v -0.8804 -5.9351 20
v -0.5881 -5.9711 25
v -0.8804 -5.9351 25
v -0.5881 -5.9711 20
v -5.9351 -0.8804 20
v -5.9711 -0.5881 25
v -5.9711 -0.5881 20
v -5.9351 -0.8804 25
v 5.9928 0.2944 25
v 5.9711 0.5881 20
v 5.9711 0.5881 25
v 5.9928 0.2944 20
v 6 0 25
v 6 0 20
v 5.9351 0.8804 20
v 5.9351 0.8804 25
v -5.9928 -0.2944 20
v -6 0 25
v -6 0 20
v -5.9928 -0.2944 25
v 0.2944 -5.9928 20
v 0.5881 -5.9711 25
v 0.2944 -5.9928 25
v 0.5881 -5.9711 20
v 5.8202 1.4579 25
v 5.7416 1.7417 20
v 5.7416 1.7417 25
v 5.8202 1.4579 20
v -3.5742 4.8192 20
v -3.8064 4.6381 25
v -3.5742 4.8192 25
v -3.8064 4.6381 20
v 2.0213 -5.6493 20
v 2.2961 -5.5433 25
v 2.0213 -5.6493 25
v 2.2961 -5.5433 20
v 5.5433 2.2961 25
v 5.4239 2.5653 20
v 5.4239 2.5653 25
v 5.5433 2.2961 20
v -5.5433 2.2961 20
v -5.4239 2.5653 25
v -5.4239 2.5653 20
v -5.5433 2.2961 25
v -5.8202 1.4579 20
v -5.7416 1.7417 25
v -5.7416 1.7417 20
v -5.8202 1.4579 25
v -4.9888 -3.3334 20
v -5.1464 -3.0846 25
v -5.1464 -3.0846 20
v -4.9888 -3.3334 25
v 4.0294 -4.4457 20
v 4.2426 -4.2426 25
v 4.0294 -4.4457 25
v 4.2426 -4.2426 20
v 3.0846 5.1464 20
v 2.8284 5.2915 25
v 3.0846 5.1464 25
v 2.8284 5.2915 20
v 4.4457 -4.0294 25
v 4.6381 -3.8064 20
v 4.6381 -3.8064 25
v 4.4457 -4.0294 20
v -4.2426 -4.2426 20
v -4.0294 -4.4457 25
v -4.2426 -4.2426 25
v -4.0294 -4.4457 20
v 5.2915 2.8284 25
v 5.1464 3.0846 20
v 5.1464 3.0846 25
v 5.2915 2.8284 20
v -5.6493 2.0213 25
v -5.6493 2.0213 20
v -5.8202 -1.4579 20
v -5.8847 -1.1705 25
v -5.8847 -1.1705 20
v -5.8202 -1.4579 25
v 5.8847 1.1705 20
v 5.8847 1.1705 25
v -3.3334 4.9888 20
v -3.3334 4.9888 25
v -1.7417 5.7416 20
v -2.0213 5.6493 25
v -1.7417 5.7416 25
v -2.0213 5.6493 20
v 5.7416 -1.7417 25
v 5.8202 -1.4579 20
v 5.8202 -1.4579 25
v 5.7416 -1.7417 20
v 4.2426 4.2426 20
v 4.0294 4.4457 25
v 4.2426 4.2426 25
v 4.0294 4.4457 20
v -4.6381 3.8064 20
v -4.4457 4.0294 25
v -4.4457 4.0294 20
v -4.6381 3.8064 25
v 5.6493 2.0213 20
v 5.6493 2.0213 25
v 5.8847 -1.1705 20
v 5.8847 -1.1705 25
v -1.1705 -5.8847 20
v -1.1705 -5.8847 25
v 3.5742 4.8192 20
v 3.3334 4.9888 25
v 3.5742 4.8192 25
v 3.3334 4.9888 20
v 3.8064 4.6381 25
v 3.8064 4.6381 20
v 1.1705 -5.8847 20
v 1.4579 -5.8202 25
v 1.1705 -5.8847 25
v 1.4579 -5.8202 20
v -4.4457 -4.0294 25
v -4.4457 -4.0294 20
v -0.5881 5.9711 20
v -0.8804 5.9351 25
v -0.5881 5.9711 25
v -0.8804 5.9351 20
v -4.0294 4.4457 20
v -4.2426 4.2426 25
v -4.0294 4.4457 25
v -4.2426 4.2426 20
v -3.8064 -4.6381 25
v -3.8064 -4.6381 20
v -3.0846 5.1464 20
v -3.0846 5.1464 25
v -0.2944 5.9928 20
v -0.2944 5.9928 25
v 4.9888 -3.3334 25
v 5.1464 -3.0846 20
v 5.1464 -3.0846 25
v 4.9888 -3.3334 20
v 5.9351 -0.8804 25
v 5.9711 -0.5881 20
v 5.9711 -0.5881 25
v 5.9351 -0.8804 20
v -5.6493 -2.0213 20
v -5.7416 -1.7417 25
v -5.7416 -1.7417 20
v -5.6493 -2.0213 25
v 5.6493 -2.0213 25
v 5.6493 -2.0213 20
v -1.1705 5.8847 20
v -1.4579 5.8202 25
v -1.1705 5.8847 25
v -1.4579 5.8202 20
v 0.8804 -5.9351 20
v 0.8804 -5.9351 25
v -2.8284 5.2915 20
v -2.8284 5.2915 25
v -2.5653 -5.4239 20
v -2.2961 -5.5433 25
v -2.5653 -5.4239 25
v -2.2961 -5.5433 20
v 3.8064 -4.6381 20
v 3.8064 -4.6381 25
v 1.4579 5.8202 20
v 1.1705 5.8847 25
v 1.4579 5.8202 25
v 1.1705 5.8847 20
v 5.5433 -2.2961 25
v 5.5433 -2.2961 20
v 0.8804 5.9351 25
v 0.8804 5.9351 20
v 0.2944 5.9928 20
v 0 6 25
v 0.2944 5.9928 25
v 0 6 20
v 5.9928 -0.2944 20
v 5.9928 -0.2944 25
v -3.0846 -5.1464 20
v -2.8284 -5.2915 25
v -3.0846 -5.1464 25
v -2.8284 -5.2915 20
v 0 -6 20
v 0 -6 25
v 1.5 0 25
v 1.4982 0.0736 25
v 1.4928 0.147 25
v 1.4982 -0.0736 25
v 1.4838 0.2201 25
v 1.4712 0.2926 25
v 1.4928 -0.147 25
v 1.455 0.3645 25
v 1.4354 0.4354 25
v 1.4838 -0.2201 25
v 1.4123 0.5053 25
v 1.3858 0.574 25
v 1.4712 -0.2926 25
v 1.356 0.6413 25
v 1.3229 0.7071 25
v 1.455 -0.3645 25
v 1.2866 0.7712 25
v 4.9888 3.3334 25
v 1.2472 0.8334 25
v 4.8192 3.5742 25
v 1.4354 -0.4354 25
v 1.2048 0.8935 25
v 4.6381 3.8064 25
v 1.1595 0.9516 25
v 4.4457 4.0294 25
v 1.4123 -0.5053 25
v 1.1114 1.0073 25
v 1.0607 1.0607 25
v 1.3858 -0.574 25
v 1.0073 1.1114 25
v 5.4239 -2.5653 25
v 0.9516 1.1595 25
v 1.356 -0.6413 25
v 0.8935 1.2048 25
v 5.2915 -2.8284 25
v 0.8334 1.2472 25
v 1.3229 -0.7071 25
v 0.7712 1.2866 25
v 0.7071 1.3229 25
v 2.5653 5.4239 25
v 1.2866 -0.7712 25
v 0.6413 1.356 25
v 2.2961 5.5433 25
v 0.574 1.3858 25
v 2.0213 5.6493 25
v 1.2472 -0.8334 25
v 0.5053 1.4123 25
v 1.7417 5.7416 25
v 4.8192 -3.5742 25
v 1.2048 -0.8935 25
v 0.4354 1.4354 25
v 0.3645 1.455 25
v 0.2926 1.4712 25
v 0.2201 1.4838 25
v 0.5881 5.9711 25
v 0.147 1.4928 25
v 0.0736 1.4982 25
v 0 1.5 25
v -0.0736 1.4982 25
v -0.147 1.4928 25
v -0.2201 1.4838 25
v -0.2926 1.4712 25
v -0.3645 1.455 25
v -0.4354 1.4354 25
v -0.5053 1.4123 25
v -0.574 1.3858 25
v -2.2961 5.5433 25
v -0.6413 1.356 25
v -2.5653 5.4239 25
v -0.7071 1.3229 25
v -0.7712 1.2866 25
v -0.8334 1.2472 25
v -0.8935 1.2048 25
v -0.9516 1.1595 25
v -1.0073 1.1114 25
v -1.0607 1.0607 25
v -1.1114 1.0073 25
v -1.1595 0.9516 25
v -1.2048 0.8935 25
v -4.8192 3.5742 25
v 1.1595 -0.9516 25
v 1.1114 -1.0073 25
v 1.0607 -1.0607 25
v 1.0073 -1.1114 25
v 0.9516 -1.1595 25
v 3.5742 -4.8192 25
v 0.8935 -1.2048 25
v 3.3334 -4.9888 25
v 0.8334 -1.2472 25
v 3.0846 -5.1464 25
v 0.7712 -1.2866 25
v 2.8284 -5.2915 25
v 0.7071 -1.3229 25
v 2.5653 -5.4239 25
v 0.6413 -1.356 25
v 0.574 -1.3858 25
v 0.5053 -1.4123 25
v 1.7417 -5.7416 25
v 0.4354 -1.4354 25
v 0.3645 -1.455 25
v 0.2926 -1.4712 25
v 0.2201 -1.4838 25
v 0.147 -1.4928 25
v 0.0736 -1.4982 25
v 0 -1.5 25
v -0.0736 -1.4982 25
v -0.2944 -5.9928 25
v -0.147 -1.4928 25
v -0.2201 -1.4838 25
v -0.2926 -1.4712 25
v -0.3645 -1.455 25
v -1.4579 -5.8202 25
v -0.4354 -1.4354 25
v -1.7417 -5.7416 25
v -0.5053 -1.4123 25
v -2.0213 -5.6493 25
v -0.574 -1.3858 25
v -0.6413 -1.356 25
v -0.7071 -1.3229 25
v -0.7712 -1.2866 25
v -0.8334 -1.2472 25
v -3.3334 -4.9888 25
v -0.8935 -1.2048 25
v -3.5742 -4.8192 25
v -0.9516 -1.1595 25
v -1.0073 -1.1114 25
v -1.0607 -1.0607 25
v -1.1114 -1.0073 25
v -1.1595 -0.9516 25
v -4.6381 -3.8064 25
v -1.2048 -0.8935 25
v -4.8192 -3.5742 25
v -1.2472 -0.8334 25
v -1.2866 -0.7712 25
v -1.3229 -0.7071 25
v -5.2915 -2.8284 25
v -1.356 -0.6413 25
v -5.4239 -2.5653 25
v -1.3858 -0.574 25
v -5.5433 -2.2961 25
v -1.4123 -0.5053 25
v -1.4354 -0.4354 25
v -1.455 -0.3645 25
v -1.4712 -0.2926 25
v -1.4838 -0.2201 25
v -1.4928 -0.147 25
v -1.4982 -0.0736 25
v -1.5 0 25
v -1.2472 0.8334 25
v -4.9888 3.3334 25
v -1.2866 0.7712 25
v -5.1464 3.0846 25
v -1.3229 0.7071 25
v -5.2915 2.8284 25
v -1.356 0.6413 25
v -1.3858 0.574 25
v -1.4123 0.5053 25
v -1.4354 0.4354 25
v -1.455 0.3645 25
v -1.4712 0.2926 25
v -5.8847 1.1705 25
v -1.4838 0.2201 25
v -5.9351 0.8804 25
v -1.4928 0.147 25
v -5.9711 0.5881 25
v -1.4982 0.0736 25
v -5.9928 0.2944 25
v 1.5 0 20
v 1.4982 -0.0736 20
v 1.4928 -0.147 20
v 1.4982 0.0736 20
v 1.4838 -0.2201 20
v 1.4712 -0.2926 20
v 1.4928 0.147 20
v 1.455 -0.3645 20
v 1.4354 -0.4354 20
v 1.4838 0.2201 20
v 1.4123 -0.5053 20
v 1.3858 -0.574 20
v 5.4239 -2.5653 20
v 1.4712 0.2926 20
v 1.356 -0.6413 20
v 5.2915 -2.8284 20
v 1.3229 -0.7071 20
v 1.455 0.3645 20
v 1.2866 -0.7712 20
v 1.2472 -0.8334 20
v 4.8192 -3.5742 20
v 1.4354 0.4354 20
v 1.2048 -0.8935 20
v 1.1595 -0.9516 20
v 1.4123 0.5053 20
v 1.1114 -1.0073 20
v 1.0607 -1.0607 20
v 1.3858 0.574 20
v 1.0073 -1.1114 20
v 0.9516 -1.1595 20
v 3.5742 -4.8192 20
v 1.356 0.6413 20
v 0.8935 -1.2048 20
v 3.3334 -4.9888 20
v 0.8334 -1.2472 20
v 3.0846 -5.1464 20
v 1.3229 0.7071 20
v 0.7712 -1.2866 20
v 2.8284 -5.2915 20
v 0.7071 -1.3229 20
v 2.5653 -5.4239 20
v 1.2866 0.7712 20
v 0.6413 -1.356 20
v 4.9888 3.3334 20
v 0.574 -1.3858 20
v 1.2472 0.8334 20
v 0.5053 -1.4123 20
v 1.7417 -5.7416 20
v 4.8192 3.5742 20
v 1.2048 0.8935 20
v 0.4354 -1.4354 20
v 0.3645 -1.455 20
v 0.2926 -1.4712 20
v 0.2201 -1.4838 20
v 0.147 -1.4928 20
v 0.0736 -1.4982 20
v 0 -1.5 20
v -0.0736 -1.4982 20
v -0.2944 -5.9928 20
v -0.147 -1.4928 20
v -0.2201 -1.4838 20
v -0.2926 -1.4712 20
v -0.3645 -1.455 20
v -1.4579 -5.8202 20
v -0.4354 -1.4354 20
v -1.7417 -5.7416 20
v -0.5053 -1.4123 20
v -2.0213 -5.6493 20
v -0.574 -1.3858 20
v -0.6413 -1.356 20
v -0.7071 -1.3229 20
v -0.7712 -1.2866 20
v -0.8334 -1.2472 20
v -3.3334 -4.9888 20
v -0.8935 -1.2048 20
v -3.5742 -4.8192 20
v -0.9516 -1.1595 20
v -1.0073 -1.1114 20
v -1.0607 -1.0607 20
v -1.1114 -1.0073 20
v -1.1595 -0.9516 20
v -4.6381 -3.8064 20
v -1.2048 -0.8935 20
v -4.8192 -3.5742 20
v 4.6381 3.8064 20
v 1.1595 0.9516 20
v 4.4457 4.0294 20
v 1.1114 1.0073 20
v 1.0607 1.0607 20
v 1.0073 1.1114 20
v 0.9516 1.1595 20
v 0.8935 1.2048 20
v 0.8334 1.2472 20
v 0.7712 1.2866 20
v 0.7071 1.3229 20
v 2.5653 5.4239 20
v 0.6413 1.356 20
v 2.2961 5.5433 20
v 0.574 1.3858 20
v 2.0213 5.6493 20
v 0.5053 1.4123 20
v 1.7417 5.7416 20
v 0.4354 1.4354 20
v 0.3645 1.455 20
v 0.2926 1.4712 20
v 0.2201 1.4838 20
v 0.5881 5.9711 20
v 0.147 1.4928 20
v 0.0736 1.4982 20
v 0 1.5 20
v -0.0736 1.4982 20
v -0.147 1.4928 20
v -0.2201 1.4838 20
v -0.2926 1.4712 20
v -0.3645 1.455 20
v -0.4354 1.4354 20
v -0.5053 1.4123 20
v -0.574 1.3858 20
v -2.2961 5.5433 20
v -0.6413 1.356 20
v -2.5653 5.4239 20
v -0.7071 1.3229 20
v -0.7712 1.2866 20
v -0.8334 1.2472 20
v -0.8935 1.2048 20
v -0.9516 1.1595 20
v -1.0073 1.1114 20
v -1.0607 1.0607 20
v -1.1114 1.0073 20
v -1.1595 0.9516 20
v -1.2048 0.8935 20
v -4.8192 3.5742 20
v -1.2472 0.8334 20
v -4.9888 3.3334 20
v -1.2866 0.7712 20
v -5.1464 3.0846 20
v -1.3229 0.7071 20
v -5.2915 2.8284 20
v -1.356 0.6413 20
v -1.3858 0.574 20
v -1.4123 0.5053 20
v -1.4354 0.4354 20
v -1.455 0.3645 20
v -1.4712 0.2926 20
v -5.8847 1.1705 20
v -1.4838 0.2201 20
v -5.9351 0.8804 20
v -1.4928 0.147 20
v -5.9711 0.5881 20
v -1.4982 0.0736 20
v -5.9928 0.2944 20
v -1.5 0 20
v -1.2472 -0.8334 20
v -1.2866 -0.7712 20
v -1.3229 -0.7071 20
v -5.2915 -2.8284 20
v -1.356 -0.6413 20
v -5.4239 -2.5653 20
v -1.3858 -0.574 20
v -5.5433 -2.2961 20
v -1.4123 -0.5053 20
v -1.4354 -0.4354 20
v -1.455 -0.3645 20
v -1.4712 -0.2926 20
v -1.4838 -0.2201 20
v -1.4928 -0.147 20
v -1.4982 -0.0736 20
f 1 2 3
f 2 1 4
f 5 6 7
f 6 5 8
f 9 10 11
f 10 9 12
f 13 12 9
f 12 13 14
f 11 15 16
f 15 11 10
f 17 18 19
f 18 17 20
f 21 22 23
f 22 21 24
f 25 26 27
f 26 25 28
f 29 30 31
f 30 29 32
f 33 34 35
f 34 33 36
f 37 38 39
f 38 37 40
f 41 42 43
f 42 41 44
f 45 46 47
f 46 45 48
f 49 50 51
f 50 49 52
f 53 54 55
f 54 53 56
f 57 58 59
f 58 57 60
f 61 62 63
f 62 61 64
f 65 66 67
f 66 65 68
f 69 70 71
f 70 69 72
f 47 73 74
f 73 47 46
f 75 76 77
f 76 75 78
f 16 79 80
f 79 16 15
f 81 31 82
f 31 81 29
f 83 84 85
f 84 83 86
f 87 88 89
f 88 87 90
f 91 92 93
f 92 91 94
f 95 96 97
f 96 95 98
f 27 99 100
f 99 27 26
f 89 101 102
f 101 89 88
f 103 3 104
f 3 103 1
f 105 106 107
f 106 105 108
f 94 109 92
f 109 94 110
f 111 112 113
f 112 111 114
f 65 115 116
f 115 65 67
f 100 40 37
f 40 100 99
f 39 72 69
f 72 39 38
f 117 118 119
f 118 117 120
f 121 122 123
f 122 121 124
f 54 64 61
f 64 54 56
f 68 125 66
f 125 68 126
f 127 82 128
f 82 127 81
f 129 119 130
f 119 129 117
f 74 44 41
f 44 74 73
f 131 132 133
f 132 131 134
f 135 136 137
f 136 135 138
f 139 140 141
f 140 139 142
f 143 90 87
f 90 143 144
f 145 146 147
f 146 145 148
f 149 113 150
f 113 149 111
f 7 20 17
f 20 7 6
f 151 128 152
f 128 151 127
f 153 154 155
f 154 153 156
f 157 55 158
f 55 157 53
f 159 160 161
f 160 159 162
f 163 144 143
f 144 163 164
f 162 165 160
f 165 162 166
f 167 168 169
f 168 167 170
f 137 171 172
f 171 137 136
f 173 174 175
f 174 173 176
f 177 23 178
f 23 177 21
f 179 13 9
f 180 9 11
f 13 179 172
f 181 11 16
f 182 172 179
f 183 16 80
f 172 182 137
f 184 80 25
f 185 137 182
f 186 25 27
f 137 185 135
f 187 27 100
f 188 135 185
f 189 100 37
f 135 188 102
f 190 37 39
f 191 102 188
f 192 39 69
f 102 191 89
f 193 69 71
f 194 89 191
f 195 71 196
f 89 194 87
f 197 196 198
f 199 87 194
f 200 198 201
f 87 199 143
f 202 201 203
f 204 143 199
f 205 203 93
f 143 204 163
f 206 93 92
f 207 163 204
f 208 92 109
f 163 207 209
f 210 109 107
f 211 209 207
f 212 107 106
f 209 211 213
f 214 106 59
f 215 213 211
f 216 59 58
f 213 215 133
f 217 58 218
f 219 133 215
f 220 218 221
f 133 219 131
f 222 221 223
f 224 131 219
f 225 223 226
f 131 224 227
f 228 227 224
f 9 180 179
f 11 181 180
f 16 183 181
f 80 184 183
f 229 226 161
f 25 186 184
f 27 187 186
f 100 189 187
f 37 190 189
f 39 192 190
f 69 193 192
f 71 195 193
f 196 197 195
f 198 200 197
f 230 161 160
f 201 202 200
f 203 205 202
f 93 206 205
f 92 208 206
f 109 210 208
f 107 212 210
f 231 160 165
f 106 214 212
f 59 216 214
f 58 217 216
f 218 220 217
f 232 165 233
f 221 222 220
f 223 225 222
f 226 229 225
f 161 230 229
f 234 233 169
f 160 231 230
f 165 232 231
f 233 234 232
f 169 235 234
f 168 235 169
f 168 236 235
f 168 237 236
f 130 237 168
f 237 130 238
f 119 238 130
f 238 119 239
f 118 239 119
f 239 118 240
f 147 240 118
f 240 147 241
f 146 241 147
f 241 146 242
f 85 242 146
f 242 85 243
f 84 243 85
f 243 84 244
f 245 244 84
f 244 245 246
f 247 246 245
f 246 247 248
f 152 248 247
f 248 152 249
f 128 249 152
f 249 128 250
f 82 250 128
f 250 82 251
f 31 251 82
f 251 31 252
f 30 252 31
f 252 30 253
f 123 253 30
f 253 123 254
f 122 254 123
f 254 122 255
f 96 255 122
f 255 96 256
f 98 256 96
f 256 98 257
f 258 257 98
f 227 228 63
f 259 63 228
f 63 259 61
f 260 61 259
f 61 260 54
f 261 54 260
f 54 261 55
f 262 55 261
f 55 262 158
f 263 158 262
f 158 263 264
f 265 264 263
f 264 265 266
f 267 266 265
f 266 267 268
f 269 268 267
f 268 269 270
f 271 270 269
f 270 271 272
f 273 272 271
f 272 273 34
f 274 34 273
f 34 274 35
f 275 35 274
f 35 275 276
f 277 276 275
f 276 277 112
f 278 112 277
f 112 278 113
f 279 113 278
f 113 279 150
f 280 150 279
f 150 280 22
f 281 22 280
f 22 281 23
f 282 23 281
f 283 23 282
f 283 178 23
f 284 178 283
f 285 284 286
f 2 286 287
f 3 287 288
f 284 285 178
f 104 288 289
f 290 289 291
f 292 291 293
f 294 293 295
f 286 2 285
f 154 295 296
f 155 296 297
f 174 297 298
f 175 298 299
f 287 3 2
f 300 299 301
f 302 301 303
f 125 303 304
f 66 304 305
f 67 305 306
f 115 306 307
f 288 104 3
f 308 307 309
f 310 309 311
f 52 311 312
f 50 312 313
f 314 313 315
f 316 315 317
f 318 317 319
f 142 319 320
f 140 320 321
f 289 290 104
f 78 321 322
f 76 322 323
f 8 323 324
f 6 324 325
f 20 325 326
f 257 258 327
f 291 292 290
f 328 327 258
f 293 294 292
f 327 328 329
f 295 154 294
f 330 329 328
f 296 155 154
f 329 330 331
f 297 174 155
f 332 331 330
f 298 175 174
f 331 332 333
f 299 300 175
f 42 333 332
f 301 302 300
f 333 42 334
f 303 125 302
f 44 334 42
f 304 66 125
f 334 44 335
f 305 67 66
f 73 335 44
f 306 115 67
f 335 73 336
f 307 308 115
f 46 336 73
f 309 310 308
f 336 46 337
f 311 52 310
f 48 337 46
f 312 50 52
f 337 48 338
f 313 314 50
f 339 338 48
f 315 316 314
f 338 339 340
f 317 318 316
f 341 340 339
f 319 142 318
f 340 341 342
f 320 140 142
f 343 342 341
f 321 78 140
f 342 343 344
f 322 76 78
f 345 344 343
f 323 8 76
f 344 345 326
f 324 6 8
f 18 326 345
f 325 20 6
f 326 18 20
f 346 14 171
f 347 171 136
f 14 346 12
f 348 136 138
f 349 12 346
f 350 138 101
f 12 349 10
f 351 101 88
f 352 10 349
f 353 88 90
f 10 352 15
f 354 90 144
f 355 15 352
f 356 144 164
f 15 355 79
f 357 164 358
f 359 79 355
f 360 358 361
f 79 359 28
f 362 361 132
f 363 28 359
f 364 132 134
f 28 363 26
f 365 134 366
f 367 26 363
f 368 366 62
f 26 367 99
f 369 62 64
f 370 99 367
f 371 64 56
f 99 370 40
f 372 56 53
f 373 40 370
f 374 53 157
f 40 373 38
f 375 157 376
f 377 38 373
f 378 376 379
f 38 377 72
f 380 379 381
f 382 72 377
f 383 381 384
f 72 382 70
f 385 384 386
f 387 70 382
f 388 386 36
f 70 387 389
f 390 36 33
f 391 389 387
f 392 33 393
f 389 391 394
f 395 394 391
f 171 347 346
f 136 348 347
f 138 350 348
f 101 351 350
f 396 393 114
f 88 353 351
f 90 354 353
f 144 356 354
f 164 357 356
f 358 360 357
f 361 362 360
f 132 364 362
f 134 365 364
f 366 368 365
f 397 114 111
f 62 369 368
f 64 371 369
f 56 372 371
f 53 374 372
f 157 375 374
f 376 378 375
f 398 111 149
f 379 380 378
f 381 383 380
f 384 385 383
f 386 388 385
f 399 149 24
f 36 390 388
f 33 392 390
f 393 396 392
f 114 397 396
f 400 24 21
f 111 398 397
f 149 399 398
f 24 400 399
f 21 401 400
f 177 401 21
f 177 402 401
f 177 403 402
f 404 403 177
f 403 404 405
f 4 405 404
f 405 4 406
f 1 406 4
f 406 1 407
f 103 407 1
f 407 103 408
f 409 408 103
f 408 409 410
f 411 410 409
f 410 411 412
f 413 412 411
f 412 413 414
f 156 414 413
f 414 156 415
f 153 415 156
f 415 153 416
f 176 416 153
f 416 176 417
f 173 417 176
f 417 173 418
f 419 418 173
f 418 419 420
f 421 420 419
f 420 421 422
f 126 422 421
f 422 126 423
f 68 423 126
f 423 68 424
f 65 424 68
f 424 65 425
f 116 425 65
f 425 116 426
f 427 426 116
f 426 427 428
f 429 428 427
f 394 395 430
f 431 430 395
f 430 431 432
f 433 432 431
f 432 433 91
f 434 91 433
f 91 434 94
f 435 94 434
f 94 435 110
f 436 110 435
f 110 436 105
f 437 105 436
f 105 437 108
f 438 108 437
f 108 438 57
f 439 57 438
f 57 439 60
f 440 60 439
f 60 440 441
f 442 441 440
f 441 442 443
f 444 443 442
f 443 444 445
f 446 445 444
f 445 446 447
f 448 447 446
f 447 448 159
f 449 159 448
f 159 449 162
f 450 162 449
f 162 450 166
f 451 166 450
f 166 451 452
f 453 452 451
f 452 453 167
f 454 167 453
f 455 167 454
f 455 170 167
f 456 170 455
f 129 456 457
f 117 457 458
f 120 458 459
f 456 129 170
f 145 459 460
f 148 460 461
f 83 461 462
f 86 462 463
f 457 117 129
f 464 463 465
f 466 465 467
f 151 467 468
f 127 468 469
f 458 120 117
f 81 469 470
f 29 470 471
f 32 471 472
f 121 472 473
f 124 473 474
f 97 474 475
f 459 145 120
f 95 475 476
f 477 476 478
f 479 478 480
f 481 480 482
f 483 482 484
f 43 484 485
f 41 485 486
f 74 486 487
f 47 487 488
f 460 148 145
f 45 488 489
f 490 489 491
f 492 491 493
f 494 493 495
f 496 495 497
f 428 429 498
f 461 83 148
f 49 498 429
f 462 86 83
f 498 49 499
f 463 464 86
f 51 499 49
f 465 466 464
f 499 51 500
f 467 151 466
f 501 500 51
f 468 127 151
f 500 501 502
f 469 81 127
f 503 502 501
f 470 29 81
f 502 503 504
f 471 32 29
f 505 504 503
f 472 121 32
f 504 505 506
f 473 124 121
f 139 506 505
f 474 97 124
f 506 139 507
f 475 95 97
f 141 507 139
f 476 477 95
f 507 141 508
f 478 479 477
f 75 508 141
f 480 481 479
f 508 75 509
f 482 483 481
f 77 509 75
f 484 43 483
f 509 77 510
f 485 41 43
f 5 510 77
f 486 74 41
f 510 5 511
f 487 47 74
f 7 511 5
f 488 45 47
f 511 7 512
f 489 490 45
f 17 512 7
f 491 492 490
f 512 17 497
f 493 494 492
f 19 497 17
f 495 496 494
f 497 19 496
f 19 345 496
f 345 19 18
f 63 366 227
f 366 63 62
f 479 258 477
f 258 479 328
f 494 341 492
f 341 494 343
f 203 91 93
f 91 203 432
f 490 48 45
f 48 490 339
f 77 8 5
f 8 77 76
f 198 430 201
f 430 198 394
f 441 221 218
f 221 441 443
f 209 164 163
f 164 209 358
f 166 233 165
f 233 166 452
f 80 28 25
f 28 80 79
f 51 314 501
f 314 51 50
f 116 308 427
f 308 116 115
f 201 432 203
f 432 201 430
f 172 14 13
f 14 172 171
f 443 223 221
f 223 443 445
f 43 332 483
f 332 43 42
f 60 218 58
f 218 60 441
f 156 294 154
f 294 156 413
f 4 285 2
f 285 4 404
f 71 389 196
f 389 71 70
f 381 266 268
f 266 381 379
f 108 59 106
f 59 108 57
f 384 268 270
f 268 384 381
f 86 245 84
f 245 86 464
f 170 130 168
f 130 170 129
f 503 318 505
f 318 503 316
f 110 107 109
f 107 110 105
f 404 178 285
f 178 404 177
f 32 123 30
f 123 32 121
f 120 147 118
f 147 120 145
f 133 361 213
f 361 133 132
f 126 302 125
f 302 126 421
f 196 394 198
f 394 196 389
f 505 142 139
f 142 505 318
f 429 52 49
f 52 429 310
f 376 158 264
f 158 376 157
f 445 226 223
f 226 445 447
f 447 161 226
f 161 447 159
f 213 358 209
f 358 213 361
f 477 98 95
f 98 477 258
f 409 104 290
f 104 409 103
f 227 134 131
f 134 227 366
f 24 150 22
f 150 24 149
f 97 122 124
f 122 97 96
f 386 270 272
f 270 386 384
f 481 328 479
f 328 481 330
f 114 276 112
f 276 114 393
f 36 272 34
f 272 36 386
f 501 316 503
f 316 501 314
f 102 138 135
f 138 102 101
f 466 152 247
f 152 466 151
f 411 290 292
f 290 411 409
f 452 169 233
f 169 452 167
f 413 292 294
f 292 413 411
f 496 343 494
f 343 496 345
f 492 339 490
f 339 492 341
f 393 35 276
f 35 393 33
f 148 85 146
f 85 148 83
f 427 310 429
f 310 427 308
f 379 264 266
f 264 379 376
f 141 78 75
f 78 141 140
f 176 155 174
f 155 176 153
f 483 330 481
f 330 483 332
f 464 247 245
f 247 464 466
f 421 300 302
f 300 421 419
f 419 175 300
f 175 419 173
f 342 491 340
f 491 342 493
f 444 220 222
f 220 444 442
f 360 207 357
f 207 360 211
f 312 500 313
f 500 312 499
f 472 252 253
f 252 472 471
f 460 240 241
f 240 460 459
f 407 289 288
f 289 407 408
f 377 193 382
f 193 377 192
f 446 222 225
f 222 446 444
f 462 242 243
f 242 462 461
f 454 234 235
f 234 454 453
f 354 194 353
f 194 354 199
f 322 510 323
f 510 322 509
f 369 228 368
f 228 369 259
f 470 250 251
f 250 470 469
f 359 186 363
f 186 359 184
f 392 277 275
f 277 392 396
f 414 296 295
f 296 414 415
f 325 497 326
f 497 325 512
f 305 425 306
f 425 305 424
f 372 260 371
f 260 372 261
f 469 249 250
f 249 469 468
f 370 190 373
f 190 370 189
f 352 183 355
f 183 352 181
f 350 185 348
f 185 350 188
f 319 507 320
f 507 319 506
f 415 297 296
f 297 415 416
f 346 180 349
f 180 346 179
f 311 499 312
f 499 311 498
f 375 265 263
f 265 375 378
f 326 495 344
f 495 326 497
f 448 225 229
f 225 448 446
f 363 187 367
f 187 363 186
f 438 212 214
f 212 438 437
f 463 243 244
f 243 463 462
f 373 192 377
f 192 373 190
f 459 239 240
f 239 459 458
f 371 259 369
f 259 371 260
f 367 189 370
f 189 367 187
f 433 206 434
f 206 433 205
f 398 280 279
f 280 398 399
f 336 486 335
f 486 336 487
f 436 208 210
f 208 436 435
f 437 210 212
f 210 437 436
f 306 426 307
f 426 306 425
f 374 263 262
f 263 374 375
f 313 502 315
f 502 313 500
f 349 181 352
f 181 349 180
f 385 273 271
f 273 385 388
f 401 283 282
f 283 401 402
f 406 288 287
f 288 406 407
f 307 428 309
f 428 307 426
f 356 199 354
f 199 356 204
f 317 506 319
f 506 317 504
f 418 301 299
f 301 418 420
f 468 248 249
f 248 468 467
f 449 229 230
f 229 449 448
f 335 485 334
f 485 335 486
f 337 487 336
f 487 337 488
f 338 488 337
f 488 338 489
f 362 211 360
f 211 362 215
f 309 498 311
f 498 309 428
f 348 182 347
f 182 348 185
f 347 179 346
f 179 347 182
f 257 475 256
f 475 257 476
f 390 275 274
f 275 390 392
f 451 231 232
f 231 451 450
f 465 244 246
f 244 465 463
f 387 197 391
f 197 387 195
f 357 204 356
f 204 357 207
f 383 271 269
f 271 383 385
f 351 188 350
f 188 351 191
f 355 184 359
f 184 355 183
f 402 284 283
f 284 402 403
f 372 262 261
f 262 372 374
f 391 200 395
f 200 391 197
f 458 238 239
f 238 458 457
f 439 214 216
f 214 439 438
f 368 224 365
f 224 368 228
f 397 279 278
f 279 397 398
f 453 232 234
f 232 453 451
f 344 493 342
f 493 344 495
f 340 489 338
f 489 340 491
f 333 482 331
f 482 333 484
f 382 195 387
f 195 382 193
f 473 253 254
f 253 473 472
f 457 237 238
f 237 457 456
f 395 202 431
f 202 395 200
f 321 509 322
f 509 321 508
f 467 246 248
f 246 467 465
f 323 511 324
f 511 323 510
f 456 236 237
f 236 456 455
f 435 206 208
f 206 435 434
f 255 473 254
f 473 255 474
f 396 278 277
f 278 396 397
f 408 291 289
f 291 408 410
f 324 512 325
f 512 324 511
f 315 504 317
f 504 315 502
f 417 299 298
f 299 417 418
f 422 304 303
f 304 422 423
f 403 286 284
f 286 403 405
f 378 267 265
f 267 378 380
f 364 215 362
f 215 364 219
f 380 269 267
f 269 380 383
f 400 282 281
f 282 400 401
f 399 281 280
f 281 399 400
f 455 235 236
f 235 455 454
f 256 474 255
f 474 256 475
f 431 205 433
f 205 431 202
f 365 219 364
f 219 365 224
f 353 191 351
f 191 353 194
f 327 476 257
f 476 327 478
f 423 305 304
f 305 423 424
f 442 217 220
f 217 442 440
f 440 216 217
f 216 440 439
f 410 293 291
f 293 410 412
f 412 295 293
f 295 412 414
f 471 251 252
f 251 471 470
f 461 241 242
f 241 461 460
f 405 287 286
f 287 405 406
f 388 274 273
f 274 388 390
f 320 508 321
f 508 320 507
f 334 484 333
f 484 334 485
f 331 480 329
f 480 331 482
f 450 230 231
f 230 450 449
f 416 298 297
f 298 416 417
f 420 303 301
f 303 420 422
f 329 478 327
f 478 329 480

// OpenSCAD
// Straight hose-barb reducer - joins 8mm ID tubing to 5mm ID tubing.
// Prints standing upright along Z, centred on origin.

$fn = 128;

// Dimensions
z_start = 0;
z_8mm_end = 20;
z_collar_start = 20;
z_collar_end = 25;
z_5mm_end = 41;

// 8mm Tubing Barbs (z = 0 to 20)
// Two stacked barbs, each 10mm tall.
// Profile: OD grows 7.5 -> 9.5, then steps back to 7.5.
barb_8_height = 10;
barb_8_bottom_od = 7.5;
barb_8_top_od = 9.5;
barb_8_step_od = 7.5;

// 5mm Tubing Barbs (z = 25 to 41)
// Two stacked barbs, each 8mm tall.
// Profile: OD shrinks 6.5 -> 5.0, then steps back to 6.5.
barb_5_height = 8;
barb_5_bottom_od = 6.5;
barb_5_top_od = 5.0;
barb_5_step_od = 6.5;

// Common features
bore_diameter = 3;
collar_diameter = 12;

// Generate the 8mm barb profile points for rotate_extrude
// We need the profile from z=0 to z=20.
// Barb 1: z=0 to 10. Barb 2: z=10 to 20.
// Each barb: OD grows linearly, then steps.
// Since we are extruding a 2D profile around Z, the profile is (radius, z).
// We define the profile from z=0 to z=20.

// Barb 1 (z=0 to 10):
// Radius starts at barb_8_bottom_od/2.
// At z=10, radius is barb_8_top_od/2.
// Then step down to barb_8_step_od/2 at z=10.
// Barb 2 (z=10 to 20):
// Radius starts at barb_8_step_od/2.
// At z=20, radius is barb_8_top_od/2.

// Construct the list of points for the 8mm section
// Format: [radius, z]
profile_8mm = [
    [barb_8_bottom_od / 2, 0],
    [barb_8_top_od / 2, barb_8_height],
    [barb_8_step_od / 2, barb_8_height],
    [barb_8_step_od / 2, 2 * barb_8_height],
    [barb_8_top_od / 2, 2 * barb_8_height]
];

// Generate the 5mm barb profile points for rotate_extrude
// Section z=25 to z=41.
// Barb 1: z=25 to 33. Barb 2: z=33 to 41.
// Each barb: OD shrinks linearly, then steps.
// Barb 1 (z=25 to 33):
// Radius starts at barb_5_bottom_od/2.
// At z=33, radius is barb_5_top_od/2.
// Then step down to barb_5_step_od/2 at z=33.
// Barb 2 (z=33 to 41):
// Radius starts at barb_5_step_od/2.
// At z=41, radius is barb_5_top_od/2.

profile_5mm = [
    [barb_5_bottom_od / 2, 25],
    [barb_5_top_od / 2, 25 + barb_5_height],
    [barb_5_step_od / 2, 25 + barb_5_height],
    [barb_5_step_od / 2, 25 + 2 * barb_5_height],
    [barb_5_top_od / 2, 25 + 2 * barb_5_height]
];

difference() {
    union() {
        // 8mm Barbs Section (z=0 to 20)
        // Using rotate_extrude to build the 3D shape from the (radius, z) profile
        rotate_extrude() polygon(profile_8mm);

        // Collar Section (z=20 to 25)
        // This is a cylinder of diameter 12 from z=20 to z=25
        translate([0, 0, 20]) cylinder(h = 5, d = collar_diameter);

        // 5mm Barbs Section (z=25 to 41)
        // Using rotate_extrude to build the 3D shape from the (radius, z) profile
        translate([0, 0, 25]) rotate_extrude() polygon(profile_5mm);
    }

    // Bore through the entire length
    // The bore needs to extend slightly past the part to ensure clean cutting
    translate([0, 0, -1]) cylinder(h = z_5mm_end + 2, d = bore_diameter);
}
